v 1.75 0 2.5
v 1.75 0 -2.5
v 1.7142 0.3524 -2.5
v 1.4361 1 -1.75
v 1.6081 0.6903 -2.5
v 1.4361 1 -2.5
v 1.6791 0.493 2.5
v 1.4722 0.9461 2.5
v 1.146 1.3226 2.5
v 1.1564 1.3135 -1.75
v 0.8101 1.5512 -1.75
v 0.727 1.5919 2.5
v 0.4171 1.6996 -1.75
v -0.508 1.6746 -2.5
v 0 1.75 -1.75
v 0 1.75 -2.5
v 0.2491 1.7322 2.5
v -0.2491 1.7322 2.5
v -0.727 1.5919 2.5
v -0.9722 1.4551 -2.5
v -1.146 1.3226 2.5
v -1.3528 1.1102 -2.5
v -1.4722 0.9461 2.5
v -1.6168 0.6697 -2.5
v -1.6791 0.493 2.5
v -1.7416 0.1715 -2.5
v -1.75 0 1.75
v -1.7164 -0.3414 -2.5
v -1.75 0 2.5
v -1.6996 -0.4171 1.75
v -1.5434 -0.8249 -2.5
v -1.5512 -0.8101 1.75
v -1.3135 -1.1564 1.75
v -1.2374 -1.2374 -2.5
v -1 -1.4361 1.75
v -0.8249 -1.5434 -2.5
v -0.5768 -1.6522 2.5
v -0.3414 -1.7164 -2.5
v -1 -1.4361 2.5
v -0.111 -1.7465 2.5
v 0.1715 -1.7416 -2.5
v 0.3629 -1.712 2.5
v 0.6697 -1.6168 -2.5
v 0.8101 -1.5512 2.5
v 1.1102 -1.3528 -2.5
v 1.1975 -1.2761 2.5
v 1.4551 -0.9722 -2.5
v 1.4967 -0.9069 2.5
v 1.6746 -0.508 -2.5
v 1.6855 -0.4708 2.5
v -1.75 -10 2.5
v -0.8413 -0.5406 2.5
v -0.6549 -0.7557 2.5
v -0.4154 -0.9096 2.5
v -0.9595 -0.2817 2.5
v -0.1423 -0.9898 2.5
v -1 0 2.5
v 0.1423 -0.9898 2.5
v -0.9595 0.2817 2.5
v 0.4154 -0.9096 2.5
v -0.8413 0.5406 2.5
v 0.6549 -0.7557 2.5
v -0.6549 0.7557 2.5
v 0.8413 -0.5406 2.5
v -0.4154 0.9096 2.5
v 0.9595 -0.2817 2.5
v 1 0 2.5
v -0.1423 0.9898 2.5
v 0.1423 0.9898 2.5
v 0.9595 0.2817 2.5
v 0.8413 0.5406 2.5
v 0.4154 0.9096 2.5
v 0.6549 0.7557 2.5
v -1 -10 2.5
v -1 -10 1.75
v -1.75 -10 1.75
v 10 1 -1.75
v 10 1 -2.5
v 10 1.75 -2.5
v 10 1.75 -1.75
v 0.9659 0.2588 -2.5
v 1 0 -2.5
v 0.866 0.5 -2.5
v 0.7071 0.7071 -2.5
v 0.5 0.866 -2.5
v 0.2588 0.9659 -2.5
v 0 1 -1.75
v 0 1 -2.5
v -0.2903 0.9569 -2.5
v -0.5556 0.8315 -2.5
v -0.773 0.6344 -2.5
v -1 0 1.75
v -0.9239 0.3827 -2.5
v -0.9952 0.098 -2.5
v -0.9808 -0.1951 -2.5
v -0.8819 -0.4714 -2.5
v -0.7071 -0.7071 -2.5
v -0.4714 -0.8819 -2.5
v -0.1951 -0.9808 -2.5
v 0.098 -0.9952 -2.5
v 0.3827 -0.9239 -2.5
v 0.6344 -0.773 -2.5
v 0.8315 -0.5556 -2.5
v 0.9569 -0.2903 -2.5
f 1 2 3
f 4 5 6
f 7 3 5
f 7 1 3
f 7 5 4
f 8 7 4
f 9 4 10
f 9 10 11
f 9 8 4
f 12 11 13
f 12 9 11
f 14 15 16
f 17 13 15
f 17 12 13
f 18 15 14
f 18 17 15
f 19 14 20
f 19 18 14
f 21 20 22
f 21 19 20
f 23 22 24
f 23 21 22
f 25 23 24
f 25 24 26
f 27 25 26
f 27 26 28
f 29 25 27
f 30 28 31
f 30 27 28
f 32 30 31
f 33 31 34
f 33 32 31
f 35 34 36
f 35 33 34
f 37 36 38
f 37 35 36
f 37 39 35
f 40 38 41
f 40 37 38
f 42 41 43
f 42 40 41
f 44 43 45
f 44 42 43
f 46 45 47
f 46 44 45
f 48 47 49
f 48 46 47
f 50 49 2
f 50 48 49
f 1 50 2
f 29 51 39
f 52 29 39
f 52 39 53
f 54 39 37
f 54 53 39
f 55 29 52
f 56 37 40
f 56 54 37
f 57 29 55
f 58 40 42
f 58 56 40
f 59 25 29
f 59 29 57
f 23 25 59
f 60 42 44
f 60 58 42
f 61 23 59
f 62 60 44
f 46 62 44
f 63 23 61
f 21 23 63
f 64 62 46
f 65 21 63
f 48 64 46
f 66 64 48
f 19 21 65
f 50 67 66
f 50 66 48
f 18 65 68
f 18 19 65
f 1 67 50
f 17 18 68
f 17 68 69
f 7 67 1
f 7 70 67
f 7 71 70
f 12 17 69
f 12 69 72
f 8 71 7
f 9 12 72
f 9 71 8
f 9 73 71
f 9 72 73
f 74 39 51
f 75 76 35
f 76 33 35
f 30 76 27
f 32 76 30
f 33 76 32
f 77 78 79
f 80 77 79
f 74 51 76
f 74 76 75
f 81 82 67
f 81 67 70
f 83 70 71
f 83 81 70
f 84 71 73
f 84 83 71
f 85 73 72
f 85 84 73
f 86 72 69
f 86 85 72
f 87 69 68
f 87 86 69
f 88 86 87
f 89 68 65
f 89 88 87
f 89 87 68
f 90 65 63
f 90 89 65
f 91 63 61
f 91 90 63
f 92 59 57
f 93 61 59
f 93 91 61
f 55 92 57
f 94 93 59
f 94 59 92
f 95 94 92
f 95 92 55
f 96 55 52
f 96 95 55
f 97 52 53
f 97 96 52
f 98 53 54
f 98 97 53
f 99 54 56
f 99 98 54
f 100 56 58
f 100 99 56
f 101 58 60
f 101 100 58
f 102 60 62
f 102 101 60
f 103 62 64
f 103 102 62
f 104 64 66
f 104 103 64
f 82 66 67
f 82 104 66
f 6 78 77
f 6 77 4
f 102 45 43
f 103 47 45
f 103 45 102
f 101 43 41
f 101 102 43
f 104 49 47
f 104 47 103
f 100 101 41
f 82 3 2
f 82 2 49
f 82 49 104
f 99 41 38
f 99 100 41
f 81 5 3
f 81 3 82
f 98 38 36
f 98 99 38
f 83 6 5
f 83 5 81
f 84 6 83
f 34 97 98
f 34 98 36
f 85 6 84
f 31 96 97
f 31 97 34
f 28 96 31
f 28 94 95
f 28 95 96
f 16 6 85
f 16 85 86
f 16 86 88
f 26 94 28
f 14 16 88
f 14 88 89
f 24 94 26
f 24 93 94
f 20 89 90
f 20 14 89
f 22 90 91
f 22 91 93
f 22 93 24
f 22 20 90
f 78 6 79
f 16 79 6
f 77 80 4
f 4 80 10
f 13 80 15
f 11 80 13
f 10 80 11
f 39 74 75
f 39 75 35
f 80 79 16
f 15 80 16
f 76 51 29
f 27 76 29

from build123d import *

# Parameters (mm, degrees)
SKETCH_1_R      = 1.75
SKETCH_1_R_2    = 1
EXTRUDE_1_DEPTH = 2.5
SKETCH_3_W      = 0.75
SKETCH_3_H      = 10
EXTRUDE_2_DEPTH = 0.75
SKETCH_4_W      = 10
SKETCH_4_H      = 0.75
EXTRUDE_3_DEPTH = 0.75


with BuildPart() as part:
    # 草图1 → 凸台-拉伸1 (new, symmetric)
    with BuildSketch(Plane.XY):
        Circle(SKETCH_1_R)
        Circle(SKETCH_1_R_2, mode=Mode.SUBTRACT)
    extrude(amount=EXTRUDE_1_DEPTH, both=True)

    # 草图3 → 凸台-拉伸2 (add)
    with BuildSketch(Plane.XY.offset(2.5)):
        with Locations((-1.375, -5)):
            Rectangle(SKETCH_3_W, SKETCH_3_H)
    extrude(amount=-EXTRUDE_2_DEPTH)

    # 草图4 → 凸台-拉伸3 (add)
    with BuildSketch(Plane(origin=(0, 0, -2.5), x_dir=(-1, 0, 0), z_dir=(0, 0, -1))):
        with Locations((-5, 1.375)):
            Rectangle(SKETCH_4_W, SKETCH_4_H)
    extrude(amount=-EXTRUDE_3_DEPTH)


solid = part.part
